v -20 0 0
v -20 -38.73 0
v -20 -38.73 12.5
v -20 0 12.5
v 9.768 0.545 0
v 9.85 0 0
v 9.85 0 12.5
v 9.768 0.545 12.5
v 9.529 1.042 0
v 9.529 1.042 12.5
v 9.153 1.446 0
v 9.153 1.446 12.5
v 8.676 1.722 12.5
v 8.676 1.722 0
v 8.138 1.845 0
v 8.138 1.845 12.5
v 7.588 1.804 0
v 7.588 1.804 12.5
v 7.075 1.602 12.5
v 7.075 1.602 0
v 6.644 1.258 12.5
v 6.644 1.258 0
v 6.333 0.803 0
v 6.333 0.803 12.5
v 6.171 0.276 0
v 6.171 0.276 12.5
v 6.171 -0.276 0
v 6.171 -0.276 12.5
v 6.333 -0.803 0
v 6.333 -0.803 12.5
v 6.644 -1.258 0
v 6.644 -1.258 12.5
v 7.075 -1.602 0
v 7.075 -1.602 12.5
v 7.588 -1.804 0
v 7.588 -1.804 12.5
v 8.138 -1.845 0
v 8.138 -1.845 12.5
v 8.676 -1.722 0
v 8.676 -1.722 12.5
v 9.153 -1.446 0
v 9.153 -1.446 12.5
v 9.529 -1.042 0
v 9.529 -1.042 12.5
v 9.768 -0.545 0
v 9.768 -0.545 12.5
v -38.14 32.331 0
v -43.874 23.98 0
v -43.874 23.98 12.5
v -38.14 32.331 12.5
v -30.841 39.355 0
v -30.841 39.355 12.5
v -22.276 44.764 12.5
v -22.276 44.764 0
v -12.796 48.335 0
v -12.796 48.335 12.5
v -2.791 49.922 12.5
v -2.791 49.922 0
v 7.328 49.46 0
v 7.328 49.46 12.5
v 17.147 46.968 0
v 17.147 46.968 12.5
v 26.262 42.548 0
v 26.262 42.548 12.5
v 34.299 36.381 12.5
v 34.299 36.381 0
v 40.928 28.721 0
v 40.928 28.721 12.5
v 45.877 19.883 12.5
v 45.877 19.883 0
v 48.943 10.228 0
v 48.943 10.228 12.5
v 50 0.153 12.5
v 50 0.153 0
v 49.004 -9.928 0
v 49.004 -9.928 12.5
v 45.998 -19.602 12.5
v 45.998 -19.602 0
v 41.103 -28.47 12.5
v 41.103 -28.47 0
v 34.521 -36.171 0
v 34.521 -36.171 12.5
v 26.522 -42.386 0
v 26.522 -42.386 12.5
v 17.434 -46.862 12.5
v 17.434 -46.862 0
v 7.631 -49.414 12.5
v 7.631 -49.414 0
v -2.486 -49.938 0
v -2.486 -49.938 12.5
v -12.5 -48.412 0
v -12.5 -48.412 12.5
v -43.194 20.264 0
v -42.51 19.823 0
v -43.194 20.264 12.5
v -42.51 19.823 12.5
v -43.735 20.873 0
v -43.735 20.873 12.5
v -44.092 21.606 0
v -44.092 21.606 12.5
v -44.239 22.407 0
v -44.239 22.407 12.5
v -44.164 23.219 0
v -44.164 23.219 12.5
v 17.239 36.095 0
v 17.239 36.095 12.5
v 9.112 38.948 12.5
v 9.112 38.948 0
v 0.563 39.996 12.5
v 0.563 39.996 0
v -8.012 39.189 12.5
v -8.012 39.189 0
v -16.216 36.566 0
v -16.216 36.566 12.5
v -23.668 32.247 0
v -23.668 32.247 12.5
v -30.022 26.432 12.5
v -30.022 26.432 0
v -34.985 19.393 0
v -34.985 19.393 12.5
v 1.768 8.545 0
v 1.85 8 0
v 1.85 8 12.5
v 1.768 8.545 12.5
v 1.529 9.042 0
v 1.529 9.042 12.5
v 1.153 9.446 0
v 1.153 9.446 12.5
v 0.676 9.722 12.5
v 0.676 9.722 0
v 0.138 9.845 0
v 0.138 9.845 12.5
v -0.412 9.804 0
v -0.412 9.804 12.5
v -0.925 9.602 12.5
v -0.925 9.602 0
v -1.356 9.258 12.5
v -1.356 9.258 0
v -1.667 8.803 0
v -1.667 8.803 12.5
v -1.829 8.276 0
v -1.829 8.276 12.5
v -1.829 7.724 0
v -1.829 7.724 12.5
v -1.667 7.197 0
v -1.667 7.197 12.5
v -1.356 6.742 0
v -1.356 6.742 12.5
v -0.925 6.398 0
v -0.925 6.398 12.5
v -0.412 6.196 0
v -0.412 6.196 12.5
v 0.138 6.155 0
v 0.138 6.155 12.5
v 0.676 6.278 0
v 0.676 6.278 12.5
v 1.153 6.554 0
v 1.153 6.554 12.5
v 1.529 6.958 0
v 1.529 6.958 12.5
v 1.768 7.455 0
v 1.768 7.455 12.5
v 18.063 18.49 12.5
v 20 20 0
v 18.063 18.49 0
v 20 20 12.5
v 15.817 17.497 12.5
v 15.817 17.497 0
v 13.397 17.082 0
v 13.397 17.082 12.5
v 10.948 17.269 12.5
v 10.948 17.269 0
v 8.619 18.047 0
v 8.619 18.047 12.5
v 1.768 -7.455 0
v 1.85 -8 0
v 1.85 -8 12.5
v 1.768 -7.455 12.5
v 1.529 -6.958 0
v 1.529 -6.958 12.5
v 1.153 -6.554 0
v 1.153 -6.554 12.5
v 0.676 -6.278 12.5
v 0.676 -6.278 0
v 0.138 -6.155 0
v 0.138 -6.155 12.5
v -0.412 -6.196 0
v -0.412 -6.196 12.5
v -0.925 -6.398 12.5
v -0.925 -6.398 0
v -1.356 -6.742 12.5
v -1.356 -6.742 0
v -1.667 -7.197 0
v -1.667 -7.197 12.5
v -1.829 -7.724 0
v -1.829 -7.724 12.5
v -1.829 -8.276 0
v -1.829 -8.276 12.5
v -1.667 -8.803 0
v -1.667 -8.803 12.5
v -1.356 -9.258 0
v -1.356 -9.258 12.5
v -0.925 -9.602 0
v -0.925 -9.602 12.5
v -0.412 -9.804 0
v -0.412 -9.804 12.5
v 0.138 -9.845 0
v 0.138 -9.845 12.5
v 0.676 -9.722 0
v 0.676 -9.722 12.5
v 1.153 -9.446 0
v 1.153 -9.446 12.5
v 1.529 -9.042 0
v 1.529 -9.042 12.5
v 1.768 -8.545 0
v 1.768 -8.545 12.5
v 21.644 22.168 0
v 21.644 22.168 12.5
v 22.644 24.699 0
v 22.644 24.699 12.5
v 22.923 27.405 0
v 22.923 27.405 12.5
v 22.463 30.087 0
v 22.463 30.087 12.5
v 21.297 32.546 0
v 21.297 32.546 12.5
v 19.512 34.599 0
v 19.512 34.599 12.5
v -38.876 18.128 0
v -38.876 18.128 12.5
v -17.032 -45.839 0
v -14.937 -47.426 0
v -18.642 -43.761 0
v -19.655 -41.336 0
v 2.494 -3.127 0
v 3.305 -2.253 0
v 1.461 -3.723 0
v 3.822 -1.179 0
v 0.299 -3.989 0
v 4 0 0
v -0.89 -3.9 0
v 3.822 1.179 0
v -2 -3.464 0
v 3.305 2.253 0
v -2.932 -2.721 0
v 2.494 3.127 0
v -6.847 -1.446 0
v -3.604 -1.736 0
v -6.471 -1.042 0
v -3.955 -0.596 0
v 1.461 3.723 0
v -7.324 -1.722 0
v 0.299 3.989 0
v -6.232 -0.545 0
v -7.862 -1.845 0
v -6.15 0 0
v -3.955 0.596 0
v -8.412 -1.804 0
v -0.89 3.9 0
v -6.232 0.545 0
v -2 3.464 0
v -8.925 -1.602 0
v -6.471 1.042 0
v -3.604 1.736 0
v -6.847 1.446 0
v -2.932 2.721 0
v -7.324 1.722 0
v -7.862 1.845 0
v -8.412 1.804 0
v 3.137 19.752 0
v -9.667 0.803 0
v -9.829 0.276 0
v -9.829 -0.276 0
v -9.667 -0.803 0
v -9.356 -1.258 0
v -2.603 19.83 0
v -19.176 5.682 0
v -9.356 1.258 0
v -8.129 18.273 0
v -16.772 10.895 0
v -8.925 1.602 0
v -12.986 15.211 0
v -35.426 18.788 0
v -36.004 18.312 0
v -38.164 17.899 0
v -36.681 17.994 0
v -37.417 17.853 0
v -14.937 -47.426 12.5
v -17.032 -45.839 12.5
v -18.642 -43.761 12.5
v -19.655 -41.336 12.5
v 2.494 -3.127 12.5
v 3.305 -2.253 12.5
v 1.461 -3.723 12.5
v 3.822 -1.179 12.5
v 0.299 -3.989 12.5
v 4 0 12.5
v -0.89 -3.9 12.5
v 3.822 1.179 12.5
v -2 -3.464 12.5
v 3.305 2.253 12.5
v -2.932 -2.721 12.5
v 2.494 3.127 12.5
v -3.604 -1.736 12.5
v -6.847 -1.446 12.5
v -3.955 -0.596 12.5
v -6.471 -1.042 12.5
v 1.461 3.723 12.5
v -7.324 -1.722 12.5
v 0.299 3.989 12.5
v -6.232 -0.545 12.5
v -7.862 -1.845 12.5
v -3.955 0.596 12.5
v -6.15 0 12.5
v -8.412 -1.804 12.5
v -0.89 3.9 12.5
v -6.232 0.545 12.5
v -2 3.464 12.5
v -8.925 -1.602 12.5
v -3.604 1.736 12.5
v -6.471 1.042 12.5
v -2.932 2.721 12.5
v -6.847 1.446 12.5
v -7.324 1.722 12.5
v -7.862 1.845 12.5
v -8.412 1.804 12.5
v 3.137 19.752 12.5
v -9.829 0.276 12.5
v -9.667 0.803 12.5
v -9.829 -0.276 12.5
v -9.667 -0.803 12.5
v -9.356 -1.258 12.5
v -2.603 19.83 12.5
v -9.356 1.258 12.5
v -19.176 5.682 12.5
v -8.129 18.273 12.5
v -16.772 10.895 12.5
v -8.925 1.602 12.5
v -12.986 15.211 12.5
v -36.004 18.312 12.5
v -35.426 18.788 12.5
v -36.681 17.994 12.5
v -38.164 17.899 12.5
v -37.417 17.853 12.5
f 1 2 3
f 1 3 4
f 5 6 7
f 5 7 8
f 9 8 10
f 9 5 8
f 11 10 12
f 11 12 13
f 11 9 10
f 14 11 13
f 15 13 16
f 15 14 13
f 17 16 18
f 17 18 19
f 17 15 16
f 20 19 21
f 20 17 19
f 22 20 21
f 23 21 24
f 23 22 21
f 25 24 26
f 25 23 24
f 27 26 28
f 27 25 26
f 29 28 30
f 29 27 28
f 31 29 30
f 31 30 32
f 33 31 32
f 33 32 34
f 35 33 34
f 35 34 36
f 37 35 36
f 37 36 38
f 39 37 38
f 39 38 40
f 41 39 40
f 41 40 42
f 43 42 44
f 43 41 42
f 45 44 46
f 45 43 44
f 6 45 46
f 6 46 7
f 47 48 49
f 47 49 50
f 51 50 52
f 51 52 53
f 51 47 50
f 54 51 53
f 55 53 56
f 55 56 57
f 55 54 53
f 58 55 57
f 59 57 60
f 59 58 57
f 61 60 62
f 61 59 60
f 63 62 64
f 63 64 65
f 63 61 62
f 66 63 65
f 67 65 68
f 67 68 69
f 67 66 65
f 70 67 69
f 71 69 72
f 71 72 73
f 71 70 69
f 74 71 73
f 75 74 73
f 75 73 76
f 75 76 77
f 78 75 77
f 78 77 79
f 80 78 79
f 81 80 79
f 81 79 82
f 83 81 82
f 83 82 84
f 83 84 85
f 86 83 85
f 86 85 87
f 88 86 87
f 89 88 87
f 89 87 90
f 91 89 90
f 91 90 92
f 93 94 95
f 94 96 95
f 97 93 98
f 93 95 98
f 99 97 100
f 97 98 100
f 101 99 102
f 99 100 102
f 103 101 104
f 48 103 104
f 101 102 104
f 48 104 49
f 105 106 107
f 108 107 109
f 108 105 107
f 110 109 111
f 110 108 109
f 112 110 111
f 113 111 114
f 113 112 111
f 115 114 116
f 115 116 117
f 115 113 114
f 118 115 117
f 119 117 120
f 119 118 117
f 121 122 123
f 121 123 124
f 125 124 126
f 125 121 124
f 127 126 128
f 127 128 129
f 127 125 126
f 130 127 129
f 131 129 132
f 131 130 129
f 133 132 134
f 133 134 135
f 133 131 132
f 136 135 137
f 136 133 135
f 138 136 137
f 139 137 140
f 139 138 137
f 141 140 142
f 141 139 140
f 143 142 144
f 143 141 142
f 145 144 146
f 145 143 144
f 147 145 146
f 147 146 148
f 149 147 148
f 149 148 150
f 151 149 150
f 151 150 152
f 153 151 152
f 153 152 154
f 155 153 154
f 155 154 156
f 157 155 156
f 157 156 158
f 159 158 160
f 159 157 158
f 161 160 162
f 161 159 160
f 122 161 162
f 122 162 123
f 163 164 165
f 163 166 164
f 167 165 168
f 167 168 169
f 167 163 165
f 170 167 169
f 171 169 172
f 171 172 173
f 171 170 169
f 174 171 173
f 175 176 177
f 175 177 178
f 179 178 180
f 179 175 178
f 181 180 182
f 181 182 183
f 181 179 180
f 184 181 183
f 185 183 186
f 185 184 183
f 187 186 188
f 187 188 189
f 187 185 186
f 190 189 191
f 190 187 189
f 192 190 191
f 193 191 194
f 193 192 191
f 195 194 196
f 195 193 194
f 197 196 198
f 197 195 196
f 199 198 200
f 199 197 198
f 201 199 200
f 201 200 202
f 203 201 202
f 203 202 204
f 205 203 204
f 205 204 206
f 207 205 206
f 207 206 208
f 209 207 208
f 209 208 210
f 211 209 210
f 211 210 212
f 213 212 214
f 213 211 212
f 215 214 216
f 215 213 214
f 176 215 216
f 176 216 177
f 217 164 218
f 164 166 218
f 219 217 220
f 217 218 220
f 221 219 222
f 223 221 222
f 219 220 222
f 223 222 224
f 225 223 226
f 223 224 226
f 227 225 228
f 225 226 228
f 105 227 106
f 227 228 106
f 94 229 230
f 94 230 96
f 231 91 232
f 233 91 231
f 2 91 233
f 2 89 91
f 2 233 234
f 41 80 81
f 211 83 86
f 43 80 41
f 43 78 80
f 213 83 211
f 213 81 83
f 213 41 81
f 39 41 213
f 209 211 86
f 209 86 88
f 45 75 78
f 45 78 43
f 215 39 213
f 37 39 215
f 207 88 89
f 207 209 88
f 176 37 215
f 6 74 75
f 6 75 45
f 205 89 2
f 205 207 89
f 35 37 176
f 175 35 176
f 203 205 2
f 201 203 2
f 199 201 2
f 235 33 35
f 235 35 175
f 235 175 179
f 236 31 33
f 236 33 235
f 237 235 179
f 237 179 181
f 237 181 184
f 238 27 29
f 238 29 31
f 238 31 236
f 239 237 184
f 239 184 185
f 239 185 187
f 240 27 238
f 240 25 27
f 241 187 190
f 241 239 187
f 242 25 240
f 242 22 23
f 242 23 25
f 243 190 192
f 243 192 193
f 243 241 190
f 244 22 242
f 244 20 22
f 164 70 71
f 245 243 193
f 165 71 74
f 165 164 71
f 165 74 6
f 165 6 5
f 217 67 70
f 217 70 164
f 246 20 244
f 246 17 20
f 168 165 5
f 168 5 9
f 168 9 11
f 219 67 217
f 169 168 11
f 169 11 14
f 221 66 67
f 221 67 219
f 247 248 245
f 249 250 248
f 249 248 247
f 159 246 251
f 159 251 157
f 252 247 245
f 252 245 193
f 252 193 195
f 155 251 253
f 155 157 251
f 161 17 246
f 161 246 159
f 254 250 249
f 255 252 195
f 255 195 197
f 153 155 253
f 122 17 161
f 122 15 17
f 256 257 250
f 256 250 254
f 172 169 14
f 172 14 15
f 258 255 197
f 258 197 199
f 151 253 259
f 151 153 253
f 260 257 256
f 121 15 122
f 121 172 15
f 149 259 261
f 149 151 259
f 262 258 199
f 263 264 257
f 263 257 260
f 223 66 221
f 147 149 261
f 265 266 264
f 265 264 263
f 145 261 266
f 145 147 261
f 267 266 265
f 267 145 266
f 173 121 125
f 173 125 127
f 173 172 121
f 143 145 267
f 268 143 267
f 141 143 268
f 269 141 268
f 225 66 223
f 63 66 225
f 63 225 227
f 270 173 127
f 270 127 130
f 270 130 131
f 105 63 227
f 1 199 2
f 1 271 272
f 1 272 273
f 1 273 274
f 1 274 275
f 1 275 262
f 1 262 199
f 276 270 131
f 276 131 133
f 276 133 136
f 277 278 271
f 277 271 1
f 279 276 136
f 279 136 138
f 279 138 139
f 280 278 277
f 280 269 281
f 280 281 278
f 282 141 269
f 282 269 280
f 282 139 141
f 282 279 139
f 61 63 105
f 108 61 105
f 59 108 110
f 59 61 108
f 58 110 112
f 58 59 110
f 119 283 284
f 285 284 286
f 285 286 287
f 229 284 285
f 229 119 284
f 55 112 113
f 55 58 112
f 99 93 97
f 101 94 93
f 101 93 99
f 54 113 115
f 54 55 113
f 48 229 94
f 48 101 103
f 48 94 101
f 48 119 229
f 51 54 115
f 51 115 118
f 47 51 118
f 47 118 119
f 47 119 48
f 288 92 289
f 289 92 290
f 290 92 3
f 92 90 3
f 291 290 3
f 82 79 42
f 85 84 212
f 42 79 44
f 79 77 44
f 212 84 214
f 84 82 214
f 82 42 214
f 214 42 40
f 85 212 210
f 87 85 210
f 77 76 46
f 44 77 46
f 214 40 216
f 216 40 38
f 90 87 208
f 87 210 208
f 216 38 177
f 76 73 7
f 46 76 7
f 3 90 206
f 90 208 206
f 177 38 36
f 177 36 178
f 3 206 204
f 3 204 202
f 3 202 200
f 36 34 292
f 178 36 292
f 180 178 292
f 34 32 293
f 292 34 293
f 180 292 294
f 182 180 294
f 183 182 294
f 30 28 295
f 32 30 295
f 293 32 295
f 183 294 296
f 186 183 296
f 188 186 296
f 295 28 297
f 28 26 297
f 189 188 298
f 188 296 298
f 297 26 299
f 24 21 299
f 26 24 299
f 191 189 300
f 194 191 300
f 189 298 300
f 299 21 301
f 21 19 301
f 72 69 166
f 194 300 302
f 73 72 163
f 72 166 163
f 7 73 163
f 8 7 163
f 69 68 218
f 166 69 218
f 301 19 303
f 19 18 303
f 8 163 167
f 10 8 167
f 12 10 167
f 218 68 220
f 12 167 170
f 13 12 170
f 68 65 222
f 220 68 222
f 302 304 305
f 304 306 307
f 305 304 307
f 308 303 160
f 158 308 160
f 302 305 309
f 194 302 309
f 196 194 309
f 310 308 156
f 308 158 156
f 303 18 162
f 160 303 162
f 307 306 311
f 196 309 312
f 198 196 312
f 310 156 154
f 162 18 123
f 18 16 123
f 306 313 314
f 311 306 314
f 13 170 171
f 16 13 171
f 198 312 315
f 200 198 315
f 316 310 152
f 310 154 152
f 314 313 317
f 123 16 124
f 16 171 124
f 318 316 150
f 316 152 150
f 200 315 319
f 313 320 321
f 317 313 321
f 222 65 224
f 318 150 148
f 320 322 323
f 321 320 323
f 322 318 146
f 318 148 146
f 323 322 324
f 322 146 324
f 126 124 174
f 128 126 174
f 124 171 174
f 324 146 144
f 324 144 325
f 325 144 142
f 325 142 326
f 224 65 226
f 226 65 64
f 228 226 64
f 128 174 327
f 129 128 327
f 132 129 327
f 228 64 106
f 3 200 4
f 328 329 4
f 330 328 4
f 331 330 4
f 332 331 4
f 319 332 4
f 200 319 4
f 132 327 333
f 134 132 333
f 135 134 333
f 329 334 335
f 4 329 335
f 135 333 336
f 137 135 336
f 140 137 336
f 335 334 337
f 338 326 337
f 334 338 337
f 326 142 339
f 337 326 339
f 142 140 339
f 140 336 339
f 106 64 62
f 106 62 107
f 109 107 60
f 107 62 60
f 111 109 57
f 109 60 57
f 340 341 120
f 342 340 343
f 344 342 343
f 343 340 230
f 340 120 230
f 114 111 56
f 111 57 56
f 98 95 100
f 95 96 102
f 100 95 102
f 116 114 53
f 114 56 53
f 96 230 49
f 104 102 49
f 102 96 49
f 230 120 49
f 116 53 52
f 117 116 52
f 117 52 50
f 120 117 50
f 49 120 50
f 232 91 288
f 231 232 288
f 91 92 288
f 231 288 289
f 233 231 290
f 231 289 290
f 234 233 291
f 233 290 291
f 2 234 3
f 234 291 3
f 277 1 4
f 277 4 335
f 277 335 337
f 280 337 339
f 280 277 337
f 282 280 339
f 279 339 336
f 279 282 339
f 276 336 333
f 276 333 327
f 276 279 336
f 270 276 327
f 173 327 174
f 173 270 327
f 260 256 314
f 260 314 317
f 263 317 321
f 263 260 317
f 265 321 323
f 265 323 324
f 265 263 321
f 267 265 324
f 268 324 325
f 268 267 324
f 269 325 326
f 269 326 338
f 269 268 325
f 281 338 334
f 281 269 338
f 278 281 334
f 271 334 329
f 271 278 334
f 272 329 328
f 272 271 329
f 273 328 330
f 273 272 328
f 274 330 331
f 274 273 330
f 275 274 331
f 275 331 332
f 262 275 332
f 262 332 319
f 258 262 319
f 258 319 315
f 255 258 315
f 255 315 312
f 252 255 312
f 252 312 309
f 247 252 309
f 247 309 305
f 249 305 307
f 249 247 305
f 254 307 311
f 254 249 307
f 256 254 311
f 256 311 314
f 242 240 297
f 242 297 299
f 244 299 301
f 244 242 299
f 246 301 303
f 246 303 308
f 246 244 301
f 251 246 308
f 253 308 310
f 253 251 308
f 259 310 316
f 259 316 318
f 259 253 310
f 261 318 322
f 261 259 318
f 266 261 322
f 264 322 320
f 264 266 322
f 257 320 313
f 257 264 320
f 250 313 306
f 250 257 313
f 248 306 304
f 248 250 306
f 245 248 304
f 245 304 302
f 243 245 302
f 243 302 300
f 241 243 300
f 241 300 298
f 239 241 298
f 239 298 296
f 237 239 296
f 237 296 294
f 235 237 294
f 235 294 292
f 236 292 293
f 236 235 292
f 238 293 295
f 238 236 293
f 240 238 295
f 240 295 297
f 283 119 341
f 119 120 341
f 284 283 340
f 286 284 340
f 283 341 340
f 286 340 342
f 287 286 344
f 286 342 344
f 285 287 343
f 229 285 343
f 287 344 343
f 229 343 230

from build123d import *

# Parameters (mm, degrees)
SKETCH1_R           = 4
SKETCH1_R_2         = 1.85
BOSS_EXTRUDE1_DEPTH = 12.5
FILLET1_R           = 10
FILLET2_R           = 3
FILLET3_R           = 10


with BuildPart() as part:
    # Sketch1 → Boss-Extrude1 (new body)
    with BuildSketch(Plane.XY):
        with BuildLine():
            Line((14.142135624, 14.142135624), (28.284271247, 28.284271247))
            ThreePointArc((28.284271247, 28.284271247), (-6.945927107, 39.39231012), (-36.252311481, 16.90473047))
            Line((-36.252311481, 16.90473047), (-45.315389352, 21.130913087))
            ThreePointArc((-45.315389352, 21.130913087), (46.768835106, 17.682648638), (-20, -45.82575695))
            Line((-20, -45.82575695), (-20, 0))
            ThreePointArc((-20, 0), (-7.653668647, 18.47759065), (14.142135624, 14.142135624))
        make_face()
        Circle(SKETCH1_R, mode=Mode.SUBTRACT)
        with Locations((0, 8)):
            Circle(SKETCH1_R_2, mode=Mode.SUBTRACT)
        with Locations((8, 0)):
            Circle(SKETCH1_R_2, mode=Mode.SUBTRACT)
        with Locations((0, -8)):
            Circle(SKETCH1_R_2, mode=Mode.SUBTRACT)
        with Locations((-8, 0)):
            Circle(SKETCH1_R_2, mode=Mode.SUBTRACT)
    extrude(amount=BOSS_EXTRUDE1_DEPTH)

    # Fillet1
    fillet1_edges = [part.edges().sort_by_distance(p)[0] for p in [
        (28.284271247, 28.284271247, 6.25),
        (14.142135624, 14.142135624, 6.25),
    ]]
    fillet(fillet1_edges, radius=FILLET1_R - 0.0001)  # a hair under: the kernel refuses the full size

    # Fillet2
    fillet2_edges = [part.edges().sort_by_distance(p)[0] for p in [
        (-36.252311481, 16.90473047, 6.25),
        (-45.315389352, 21.130913087, 6.25),
    ]]
    fillet(fillet2_edges, radius=FILLET2_R)

    # Fillet3
    fillet3_edges = [part.edges().sort_by_distance(p)[0] for p in [
        (-20, -45.82575695, 6.25),
    ]]
    fillet(fillet3_edges, radius=FILLET3_R)


solid = part.part
